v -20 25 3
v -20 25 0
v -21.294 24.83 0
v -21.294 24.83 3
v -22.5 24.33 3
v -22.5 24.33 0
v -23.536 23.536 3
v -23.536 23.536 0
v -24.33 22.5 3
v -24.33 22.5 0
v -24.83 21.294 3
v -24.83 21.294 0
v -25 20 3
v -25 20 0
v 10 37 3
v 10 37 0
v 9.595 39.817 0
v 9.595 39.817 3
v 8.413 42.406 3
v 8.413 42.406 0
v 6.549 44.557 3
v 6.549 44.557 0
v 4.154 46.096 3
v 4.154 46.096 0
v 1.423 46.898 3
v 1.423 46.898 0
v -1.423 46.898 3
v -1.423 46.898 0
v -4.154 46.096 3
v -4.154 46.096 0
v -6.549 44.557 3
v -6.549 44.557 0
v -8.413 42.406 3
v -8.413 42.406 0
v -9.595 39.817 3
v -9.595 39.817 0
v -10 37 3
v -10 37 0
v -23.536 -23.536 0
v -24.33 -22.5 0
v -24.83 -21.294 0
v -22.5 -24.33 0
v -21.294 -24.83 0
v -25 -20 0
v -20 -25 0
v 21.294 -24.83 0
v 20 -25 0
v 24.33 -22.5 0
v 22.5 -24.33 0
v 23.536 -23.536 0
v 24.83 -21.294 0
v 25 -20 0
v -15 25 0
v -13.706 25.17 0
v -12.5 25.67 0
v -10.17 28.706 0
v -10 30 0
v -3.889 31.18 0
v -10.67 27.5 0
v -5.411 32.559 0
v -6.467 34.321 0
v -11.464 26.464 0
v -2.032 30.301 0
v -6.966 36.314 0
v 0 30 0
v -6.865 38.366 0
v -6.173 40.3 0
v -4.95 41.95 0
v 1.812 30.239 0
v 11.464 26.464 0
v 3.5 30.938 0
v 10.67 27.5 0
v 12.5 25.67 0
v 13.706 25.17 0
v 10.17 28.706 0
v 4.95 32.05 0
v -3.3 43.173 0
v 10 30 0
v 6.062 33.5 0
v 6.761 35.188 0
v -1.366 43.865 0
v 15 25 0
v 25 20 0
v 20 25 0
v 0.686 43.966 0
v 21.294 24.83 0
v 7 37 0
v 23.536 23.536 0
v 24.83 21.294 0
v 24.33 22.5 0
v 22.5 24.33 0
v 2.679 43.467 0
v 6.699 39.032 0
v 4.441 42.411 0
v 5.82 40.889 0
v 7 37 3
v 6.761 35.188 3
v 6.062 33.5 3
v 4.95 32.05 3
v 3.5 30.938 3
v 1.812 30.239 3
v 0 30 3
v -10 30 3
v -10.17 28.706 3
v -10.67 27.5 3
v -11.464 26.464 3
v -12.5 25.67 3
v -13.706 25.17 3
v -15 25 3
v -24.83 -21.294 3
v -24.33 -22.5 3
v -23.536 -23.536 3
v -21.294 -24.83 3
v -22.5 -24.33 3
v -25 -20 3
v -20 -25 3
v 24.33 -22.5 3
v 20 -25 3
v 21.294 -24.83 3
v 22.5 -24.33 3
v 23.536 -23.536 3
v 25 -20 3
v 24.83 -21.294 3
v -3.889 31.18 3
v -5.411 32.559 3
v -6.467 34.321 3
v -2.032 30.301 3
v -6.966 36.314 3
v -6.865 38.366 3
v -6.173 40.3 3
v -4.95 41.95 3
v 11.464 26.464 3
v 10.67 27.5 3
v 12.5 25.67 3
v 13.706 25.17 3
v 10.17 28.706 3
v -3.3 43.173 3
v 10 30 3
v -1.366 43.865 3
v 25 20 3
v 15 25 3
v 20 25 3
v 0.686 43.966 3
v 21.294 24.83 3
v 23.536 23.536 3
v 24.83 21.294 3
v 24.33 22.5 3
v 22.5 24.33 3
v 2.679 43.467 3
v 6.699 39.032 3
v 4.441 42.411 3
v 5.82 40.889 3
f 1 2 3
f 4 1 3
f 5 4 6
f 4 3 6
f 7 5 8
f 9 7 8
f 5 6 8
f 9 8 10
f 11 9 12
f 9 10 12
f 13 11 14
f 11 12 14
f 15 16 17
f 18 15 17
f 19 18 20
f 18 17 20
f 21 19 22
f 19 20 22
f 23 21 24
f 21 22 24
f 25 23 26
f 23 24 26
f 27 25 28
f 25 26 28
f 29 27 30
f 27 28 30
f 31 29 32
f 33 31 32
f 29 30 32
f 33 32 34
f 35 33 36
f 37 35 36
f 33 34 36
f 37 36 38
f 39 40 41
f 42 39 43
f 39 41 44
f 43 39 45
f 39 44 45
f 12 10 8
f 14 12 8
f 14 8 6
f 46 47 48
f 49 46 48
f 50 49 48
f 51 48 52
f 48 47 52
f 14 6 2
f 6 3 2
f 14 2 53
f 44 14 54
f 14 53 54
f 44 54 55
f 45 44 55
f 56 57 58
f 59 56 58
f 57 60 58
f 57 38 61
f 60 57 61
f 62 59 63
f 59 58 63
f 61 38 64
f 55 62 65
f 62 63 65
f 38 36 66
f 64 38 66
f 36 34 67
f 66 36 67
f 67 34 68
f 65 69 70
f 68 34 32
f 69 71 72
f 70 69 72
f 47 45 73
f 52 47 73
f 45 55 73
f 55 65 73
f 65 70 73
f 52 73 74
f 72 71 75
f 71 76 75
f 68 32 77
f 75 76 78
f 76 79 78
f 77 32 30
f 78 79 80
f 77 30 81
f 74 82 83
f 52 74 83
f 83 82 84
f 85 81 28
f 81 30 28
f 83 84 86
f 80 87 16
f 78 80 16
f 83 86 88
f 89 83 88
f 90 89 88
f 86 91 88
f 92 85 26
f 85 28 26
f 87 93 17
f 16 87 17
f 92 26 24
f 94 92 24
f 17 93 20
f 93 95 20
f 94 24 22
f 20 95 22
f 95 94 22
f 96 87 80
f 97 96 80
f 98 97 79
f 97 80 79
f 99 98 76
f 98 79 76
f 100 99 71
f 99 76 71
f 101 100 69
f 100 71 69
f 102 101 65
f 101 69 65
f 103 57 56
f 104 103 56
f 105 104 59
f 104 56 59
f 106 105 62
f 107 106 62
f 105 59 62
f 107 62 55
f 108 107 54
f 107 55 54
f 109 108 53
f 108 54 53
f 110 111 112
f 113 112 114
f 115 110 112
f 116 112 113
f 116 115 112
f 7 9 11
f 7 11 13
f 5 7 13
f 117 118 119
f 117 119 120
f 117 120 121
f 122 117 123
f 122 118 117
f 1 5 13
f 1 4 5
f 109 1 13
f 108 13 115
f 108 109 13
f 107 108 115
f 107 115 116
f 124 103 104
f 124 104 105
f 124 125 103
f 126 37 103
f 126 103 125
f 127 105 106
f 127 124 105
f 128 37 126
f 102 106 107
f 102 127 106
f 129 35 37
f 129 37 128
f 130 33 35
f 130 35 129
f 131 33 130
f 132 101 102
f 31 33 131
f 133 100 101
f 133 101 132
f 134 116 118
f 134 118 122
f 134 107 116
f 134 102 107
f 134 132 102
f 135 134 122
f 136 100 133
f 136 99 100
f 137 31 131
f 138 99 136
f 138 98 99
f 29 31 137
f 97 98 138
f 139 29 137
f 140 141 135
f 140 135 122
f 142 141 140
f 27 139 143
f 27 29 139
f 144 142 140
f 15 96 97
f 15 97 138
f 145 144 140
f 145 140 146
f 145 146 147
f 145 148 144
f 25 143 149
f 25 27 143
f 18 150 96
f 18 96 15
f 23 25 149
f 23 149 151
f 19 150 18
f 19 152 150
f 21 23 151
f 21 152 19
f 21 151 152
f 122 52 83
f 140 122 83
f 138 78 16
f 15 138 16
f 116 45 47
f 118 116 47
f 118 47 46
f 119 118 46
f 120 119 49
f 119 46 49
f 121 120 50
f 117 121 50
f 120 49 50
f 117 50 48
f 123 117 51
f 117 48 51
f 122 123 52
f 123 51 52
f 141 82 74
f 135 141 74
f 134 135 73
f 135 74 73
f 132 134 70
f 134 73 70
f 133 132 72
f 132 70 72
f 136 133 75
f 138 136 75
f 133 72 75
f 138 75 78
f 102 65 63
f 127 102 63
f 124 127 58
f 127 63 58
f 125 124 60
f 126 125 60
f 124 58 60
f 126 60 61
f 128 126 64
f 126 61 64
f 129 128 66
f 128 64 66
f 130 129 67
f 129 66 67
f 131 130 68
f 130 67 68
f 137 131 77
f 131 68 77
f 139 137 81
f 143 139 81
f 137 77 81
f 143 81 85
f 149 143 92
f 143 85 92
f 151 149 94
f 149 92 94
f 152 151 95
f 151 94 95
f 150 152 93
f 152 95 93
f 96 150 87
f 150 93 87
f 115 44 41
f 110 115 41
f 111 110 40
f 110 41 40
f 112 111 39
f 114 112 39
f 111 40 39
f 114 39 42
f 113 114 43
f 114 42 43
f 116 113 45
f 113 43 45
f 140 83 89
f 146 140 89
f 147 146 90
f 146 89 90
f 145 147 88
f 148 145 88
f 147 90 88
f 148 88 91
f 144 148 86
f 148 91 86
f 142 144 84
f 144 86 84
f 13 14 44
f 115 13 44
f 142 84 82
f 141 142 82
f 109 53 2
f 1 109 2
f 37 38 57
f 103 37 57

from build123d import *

# Parameters (mm, degrees)
F1_DEPTH = 3


with BuildPart() as f1:
    # F0 (on Top) → F1 (new body)
    with BuildSketch(Plane.XY):
        with BuildLine():
            Line((-20, -25), (20, -25))
            ThreePointArc((20, -25), (23.535534, -23.535534), (25, -20))
            Line((25, -20), (25, 20))
            ThreePointArc((25, 20), (23.535534, 23.535534), (20, 25))
            Line((20, 25), (15, 25))
            ThreePointArc((15, 25), (11.464466, 26.464466), (10, 30))
            Line((10, 30), (10, 37))
            ThreePointArc((10, 37), (0, 47), (-10, 37))
            Line((-10, 37), (-10, 30))
            ThreePointArc((-10, 30), (-11.464466, 26.464466), (-15, 25))
            Line((-15, 25), (-20, 25))
            ThreePointArc((-20, 25), (-23.535534, 23.535534), (-25, 20))
            Line((-25, 20), (-25, -20))
            ThreePointArc((-25, -20), (-23.535534, -23.535534), (-20, -25))
        make_face()
        with BuildLine():
            ThreePointArc((0, 30), (-4.949747, 41.949747), (7, 37))
            ThreePointArc((7, 37), (4.949747, 32.050253), (0, 30))
        make_face(mode=Mode.SUBTRACT)
    extrude(amount=F1_DEPTH)


solid = f1.part
